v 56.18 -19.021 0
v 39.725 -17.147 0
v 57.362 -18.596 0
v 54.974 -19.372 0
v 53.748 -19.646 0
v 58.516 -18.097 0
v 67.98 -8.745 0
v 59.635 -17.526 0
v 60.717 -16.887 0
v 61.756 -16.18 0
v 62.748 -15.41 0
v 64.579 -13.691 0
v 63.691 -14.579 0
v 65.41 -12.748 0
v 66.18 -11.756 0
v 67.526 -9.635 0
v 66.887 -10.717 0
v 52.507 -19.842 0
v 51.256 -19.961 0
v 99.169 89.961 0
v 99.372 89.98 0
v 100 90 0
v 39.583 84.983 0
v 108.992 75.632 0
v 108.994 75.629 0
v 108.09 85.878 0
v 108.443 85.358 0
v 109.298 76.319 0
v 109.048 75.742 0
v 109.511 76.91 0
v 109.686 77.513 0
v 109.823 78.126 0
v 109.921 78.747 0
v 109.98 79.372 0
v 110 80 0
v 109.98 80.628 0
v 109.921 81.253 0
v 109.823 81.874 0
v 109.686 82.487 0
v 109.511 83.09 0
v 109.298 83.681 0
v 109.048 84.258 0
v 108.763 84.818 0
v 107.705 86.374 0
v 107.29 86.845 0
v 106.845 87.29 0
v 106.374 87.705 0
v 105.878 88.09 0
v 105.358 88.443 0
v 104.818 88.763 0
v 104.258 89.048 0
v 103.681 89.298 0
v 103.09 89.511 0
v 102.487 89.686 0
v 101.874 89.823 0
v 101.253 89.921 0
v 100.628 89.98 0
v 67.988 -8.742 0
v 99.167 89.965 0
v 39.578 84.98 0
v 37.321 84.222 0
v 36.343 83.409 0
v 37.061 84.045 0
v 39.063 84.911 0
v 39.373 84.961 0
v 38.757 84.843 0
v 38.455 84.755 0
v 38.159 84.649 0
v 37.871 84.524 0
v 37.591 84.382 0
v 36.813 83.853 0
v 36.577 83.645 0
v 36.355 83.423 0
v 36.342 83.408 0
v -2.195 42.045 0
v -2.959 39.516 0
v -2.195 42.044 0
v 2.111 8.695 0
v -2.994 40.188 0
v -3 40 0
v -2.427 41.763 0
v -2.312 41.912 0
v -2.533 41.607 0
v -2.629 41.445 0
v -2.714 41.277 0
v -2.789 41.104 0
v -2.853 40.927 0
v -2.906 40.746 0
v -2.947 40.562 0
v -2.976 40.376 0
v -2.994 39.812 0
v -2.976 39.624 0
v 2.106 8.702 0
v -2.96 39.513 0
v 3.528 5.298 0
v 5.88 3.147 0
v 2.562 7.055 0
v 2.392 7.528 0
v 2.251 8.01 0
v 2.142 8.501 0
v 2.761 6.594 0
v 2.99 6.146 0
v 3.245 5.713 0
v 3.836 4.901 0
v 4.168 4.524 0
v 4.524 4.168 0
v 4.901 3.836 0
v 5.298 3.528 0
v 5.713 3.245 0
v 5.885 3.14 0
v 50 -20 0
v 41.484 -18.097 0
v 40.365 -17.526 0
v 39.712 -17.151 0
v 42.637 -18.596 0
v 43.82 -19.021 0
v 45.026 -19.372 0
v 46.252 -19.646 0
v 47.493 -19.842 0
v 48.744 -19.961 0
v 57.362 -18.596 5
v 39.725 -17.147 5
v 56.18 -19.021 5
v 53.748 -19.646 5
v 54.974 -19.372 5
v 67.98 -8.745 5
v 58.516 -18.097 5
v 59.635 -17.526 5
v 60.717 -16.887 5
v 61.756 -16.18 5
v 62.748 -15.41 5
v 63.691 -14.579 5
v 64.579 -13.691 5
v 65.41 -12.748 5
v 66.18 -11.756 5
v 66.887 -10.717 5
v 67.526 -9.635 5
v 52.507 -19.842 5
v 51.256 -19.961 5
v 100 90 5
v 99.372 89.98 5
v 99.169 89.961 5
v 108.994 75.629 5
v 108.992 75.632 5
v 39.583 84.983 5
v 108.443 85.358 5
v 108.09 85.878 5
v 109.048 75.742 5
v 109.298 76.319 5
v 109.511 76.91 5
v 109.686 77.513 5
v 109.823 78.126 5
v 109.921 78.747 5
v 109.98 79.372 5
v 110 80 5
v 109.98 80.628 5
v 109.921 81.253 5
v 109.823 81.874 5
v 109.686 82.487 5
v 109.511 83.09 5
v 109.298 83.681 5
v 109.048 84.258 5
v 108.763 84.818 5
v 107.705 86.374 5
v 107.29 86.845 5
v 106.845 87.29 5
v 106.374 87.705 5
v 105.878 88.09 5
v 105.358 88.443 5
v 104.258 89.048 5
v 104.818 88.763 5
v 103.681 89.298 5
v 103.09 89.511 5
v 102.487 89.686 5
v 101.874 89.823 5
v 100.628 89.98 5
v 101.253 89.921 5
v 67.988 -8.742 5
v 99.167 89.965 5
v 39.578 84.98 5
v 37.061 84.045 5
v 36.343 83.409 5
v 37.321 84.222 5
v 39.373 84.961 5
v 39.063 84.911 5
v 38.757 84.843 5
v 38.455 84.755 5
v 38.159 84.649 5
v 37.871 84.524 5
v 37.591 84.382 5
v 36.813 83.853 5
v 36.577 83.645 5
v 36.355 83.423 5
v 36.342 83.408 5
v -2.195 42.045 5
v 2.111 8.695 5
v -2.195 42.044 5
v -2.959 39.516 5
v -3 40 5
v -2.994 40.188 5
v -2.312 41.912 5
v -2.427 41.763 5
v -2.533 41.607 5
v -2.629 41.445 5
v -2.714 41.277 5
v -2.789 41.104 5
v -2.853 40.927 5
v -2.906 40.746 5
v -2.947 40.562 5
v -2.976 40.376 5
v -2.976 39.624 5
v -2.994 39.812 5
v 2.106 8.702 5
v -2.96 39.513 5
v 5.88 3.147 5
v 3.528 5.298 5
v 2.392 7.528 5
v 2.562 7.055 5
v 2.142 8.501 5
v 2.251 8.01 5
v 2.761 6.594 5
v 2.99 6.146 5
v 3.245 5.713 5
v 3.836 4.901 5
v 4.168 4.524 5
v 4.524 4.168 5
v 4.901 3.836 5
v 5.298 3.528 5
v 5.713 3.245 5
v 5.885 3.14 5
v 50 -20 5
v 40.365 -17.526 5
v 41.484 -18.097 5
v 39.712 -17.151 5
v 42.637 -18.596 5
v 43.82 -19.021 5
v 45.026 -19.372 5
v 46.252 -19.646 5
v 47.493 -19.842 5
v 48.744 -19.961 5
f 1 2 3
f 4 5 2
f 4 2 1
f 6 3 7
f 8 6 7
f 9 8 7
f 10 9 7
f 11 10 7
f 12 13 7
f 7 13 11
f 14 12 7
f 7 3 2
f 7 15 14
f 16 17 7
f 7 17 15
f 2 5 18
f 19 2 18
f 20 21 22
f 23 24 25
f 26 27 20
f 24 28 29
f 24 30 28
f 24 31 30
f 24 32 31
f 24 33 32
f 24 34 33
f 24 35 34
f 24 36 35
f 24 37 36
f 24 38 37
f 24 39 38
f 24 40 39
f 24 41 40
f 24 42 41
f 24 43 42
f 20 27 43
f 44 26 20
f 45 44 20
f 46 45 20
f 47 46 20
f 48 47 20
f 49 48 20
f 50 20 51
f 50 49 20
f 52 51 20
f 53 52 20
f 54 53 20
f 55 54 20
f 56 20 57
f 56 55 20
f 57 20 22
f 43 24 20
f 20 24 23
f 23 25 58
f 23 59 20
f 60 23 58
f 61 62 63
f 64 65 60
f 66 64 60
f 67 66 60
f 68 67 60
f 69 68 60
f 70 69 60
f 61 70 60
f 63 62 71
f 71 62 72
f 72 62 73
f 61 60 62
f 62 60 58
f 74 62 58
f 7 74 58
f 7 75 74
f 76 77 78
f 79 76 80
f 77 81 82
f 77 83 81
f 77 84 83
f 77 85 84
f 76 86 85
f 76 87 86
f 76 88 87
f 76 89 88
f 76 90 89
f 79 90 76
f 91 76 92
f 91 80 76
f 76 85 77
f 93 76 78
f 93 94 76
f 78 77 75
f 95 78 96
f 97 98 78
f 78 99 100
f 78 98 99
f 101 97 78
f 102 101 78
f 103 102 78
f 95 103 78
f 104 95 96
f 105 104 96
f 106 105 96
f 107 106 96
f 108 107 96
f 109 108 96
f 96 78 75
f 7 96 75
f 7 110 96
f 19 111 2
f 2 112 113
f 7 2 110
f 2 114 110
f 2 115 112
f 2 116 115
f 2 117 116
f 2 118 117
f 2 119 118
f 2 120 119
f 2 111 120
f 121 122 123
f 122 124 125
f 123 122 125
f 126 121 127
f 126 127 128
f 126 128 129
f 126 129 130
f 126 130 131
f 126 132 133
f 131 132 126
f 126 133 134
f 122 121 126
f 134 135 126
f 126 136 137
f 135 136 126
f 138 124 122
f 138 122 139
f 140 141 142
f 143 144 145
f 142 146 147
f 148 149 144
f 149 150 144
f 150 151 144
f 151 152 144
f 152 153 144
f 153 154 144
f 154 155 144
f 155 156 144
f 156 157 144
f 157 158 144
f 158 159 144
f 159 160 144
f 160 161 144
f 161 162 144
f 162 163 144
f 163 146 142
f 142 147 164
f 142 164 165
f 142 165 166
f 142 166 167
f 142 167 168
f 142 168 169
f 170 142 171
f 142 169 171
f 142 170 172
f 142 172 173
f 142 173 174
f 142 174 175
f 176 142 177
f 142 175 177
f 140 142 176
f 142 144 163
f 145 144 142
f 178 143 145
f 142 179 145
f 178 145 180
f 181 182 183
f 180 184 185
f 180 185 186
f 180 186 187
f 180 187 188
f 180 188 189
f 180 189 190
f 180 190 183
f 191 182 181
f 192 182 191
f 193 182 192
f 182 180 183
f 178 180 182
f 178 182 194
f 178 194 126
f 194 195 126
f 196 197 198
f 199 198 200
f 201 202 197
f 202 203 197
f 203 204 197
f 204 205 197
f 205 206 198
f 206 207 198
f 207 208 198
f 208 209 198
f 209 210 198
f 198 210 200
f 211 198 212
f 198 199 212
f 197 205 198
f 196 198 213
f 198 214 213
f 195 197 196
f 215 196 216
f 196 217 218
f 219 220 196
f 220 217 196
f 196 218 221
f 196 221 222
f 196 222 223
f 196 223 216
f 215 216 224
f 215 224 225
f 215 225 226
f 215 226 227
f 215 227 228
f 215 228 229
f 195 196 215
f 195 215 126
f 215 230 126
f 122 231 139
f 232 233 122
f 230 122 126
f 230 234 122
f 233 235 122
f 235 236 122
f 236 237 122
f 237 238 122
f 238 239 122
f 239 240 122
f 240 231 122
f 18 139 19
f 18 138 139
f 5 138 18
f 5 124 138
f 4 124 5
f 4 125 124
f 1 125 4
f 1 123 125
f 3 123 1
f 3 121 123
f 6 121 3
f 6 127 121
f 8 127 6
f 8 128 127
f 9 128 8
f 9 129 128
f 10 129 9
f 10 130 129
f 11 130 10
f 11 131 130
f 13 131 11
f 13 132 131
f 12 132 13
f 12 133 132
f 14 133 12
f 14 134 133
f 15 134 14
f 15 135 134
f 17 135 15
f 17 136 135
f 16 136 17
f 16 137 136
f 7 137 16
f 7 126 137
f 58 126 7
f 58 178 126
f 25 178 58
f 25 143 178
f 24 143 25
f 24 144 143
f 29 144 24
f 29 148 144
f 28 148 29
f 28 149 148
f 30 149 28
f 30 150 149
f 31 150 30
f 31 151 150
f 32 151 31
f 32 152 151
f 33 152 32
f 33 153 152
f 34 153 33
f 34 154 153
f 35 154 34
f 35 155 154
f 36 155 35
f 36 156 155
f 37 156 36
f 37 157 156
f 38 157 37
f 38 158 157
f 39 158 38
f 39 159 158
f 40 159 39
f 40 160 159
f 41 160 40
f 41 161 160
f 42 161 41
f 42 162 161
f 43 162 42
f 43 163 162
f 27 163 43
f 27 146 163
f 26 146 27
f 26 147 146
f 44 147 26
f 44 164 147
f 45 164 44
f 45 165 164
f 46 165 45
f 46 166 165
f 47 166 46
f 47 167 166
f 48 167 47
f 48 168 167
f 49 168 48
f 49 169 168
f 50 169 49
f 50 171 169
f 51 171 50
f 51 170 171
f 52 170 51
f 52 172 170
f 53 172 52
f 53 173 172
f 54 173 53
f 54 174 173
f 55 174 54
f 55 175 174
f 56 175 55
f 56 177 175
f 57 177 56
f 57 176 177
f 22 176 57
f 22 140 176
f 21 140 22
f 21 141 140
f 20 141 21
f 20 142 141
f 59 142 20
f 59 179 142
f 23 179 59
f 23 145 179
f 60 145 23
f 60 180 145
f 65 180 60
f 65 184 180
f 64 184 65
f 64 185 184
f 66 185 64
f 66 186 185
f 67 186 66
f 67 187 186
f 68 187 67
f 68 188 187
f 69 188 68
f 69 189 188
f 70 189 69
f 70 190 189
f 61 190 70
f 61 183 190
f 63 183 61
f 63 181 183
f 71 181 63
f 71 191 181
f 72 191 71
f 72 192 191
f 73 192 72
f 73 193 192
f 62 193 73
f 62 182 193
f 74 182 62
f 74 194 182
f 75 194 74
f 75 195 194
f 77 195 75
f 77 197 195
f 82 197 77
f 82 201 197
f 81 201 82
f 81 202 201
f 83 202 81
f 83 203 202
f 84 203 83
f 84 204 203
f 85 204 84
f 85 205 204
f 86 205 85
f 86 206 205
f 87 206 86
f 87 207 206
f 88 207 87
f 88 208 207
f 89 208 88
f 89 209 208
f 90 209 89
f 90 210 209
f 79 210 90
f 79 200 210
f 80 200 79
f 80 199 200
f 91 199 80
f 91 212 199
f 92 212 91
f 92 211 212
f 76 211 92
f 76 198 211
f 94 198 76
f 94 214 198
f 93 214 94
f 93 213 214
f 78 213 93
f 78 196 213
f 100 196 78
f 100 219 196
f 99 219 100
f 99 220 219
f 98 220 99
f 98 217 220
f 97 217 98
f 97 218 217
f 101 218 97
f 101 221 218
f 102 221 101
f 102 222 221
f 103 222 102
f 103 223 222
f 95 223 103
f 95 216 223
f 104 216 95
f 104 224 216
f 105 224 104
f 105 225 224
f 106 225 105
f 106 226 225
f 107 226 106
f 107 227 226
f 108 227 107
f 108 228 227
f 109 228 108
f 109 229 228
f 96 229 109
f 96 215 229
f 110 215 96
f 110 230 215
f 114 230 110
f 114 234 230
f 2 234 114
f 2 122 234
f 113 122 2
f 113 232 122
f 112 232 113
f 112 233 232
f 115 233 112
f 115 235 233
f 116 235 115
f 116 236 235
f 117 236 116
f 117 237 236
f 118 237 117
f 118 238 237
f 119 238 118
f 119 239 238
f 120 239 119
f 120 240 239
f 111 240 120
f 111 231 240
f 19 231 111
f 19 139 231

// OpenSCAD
$fn = 100;

shape = [ [10, 10, 8], [0, 40, 3], [40, 80, 5], [100, 80, 10], [50, 0, 20] ];

linear_extrude (height = 5) rounded_polygon(shape);

function next(i) = (i + 1) % len(shape);

function tangents(i, side) = tangent(shape[i], shape[next(i)], side);

module rounded_polygon(points, radius)
    union () {
        for(i = [0 : len(shape) - 1])
            translate([shape[i].x, shape[i].y]) 
                #circle(shape[i][2]);

        polygon([for(i  = [0 : len(shape) - 1]) for(side = [0, 1]) tangents(i, side)]);
    }


function tangent(p1, p2, side) =
    let (
    r1 = p1[2],
    r2 = p2[2],
    dx = p2.x - p1.x,
    dy = p2.y - p1.y,
    d = sqrt(dx * dx + dy * dy),
    theta = atan2(dy, dx) + acos((r1 - r2) / d),
    xa = p1.x +(cos(theta) * r1),
    ya = p1.y +(sin(theta) * r1),
    xb = p2.x +(cos(theta) * r2),
    yb = p2.y +(sin(theta) * r2)
    )

    side ? [xb, yb] : [xa, ya];
